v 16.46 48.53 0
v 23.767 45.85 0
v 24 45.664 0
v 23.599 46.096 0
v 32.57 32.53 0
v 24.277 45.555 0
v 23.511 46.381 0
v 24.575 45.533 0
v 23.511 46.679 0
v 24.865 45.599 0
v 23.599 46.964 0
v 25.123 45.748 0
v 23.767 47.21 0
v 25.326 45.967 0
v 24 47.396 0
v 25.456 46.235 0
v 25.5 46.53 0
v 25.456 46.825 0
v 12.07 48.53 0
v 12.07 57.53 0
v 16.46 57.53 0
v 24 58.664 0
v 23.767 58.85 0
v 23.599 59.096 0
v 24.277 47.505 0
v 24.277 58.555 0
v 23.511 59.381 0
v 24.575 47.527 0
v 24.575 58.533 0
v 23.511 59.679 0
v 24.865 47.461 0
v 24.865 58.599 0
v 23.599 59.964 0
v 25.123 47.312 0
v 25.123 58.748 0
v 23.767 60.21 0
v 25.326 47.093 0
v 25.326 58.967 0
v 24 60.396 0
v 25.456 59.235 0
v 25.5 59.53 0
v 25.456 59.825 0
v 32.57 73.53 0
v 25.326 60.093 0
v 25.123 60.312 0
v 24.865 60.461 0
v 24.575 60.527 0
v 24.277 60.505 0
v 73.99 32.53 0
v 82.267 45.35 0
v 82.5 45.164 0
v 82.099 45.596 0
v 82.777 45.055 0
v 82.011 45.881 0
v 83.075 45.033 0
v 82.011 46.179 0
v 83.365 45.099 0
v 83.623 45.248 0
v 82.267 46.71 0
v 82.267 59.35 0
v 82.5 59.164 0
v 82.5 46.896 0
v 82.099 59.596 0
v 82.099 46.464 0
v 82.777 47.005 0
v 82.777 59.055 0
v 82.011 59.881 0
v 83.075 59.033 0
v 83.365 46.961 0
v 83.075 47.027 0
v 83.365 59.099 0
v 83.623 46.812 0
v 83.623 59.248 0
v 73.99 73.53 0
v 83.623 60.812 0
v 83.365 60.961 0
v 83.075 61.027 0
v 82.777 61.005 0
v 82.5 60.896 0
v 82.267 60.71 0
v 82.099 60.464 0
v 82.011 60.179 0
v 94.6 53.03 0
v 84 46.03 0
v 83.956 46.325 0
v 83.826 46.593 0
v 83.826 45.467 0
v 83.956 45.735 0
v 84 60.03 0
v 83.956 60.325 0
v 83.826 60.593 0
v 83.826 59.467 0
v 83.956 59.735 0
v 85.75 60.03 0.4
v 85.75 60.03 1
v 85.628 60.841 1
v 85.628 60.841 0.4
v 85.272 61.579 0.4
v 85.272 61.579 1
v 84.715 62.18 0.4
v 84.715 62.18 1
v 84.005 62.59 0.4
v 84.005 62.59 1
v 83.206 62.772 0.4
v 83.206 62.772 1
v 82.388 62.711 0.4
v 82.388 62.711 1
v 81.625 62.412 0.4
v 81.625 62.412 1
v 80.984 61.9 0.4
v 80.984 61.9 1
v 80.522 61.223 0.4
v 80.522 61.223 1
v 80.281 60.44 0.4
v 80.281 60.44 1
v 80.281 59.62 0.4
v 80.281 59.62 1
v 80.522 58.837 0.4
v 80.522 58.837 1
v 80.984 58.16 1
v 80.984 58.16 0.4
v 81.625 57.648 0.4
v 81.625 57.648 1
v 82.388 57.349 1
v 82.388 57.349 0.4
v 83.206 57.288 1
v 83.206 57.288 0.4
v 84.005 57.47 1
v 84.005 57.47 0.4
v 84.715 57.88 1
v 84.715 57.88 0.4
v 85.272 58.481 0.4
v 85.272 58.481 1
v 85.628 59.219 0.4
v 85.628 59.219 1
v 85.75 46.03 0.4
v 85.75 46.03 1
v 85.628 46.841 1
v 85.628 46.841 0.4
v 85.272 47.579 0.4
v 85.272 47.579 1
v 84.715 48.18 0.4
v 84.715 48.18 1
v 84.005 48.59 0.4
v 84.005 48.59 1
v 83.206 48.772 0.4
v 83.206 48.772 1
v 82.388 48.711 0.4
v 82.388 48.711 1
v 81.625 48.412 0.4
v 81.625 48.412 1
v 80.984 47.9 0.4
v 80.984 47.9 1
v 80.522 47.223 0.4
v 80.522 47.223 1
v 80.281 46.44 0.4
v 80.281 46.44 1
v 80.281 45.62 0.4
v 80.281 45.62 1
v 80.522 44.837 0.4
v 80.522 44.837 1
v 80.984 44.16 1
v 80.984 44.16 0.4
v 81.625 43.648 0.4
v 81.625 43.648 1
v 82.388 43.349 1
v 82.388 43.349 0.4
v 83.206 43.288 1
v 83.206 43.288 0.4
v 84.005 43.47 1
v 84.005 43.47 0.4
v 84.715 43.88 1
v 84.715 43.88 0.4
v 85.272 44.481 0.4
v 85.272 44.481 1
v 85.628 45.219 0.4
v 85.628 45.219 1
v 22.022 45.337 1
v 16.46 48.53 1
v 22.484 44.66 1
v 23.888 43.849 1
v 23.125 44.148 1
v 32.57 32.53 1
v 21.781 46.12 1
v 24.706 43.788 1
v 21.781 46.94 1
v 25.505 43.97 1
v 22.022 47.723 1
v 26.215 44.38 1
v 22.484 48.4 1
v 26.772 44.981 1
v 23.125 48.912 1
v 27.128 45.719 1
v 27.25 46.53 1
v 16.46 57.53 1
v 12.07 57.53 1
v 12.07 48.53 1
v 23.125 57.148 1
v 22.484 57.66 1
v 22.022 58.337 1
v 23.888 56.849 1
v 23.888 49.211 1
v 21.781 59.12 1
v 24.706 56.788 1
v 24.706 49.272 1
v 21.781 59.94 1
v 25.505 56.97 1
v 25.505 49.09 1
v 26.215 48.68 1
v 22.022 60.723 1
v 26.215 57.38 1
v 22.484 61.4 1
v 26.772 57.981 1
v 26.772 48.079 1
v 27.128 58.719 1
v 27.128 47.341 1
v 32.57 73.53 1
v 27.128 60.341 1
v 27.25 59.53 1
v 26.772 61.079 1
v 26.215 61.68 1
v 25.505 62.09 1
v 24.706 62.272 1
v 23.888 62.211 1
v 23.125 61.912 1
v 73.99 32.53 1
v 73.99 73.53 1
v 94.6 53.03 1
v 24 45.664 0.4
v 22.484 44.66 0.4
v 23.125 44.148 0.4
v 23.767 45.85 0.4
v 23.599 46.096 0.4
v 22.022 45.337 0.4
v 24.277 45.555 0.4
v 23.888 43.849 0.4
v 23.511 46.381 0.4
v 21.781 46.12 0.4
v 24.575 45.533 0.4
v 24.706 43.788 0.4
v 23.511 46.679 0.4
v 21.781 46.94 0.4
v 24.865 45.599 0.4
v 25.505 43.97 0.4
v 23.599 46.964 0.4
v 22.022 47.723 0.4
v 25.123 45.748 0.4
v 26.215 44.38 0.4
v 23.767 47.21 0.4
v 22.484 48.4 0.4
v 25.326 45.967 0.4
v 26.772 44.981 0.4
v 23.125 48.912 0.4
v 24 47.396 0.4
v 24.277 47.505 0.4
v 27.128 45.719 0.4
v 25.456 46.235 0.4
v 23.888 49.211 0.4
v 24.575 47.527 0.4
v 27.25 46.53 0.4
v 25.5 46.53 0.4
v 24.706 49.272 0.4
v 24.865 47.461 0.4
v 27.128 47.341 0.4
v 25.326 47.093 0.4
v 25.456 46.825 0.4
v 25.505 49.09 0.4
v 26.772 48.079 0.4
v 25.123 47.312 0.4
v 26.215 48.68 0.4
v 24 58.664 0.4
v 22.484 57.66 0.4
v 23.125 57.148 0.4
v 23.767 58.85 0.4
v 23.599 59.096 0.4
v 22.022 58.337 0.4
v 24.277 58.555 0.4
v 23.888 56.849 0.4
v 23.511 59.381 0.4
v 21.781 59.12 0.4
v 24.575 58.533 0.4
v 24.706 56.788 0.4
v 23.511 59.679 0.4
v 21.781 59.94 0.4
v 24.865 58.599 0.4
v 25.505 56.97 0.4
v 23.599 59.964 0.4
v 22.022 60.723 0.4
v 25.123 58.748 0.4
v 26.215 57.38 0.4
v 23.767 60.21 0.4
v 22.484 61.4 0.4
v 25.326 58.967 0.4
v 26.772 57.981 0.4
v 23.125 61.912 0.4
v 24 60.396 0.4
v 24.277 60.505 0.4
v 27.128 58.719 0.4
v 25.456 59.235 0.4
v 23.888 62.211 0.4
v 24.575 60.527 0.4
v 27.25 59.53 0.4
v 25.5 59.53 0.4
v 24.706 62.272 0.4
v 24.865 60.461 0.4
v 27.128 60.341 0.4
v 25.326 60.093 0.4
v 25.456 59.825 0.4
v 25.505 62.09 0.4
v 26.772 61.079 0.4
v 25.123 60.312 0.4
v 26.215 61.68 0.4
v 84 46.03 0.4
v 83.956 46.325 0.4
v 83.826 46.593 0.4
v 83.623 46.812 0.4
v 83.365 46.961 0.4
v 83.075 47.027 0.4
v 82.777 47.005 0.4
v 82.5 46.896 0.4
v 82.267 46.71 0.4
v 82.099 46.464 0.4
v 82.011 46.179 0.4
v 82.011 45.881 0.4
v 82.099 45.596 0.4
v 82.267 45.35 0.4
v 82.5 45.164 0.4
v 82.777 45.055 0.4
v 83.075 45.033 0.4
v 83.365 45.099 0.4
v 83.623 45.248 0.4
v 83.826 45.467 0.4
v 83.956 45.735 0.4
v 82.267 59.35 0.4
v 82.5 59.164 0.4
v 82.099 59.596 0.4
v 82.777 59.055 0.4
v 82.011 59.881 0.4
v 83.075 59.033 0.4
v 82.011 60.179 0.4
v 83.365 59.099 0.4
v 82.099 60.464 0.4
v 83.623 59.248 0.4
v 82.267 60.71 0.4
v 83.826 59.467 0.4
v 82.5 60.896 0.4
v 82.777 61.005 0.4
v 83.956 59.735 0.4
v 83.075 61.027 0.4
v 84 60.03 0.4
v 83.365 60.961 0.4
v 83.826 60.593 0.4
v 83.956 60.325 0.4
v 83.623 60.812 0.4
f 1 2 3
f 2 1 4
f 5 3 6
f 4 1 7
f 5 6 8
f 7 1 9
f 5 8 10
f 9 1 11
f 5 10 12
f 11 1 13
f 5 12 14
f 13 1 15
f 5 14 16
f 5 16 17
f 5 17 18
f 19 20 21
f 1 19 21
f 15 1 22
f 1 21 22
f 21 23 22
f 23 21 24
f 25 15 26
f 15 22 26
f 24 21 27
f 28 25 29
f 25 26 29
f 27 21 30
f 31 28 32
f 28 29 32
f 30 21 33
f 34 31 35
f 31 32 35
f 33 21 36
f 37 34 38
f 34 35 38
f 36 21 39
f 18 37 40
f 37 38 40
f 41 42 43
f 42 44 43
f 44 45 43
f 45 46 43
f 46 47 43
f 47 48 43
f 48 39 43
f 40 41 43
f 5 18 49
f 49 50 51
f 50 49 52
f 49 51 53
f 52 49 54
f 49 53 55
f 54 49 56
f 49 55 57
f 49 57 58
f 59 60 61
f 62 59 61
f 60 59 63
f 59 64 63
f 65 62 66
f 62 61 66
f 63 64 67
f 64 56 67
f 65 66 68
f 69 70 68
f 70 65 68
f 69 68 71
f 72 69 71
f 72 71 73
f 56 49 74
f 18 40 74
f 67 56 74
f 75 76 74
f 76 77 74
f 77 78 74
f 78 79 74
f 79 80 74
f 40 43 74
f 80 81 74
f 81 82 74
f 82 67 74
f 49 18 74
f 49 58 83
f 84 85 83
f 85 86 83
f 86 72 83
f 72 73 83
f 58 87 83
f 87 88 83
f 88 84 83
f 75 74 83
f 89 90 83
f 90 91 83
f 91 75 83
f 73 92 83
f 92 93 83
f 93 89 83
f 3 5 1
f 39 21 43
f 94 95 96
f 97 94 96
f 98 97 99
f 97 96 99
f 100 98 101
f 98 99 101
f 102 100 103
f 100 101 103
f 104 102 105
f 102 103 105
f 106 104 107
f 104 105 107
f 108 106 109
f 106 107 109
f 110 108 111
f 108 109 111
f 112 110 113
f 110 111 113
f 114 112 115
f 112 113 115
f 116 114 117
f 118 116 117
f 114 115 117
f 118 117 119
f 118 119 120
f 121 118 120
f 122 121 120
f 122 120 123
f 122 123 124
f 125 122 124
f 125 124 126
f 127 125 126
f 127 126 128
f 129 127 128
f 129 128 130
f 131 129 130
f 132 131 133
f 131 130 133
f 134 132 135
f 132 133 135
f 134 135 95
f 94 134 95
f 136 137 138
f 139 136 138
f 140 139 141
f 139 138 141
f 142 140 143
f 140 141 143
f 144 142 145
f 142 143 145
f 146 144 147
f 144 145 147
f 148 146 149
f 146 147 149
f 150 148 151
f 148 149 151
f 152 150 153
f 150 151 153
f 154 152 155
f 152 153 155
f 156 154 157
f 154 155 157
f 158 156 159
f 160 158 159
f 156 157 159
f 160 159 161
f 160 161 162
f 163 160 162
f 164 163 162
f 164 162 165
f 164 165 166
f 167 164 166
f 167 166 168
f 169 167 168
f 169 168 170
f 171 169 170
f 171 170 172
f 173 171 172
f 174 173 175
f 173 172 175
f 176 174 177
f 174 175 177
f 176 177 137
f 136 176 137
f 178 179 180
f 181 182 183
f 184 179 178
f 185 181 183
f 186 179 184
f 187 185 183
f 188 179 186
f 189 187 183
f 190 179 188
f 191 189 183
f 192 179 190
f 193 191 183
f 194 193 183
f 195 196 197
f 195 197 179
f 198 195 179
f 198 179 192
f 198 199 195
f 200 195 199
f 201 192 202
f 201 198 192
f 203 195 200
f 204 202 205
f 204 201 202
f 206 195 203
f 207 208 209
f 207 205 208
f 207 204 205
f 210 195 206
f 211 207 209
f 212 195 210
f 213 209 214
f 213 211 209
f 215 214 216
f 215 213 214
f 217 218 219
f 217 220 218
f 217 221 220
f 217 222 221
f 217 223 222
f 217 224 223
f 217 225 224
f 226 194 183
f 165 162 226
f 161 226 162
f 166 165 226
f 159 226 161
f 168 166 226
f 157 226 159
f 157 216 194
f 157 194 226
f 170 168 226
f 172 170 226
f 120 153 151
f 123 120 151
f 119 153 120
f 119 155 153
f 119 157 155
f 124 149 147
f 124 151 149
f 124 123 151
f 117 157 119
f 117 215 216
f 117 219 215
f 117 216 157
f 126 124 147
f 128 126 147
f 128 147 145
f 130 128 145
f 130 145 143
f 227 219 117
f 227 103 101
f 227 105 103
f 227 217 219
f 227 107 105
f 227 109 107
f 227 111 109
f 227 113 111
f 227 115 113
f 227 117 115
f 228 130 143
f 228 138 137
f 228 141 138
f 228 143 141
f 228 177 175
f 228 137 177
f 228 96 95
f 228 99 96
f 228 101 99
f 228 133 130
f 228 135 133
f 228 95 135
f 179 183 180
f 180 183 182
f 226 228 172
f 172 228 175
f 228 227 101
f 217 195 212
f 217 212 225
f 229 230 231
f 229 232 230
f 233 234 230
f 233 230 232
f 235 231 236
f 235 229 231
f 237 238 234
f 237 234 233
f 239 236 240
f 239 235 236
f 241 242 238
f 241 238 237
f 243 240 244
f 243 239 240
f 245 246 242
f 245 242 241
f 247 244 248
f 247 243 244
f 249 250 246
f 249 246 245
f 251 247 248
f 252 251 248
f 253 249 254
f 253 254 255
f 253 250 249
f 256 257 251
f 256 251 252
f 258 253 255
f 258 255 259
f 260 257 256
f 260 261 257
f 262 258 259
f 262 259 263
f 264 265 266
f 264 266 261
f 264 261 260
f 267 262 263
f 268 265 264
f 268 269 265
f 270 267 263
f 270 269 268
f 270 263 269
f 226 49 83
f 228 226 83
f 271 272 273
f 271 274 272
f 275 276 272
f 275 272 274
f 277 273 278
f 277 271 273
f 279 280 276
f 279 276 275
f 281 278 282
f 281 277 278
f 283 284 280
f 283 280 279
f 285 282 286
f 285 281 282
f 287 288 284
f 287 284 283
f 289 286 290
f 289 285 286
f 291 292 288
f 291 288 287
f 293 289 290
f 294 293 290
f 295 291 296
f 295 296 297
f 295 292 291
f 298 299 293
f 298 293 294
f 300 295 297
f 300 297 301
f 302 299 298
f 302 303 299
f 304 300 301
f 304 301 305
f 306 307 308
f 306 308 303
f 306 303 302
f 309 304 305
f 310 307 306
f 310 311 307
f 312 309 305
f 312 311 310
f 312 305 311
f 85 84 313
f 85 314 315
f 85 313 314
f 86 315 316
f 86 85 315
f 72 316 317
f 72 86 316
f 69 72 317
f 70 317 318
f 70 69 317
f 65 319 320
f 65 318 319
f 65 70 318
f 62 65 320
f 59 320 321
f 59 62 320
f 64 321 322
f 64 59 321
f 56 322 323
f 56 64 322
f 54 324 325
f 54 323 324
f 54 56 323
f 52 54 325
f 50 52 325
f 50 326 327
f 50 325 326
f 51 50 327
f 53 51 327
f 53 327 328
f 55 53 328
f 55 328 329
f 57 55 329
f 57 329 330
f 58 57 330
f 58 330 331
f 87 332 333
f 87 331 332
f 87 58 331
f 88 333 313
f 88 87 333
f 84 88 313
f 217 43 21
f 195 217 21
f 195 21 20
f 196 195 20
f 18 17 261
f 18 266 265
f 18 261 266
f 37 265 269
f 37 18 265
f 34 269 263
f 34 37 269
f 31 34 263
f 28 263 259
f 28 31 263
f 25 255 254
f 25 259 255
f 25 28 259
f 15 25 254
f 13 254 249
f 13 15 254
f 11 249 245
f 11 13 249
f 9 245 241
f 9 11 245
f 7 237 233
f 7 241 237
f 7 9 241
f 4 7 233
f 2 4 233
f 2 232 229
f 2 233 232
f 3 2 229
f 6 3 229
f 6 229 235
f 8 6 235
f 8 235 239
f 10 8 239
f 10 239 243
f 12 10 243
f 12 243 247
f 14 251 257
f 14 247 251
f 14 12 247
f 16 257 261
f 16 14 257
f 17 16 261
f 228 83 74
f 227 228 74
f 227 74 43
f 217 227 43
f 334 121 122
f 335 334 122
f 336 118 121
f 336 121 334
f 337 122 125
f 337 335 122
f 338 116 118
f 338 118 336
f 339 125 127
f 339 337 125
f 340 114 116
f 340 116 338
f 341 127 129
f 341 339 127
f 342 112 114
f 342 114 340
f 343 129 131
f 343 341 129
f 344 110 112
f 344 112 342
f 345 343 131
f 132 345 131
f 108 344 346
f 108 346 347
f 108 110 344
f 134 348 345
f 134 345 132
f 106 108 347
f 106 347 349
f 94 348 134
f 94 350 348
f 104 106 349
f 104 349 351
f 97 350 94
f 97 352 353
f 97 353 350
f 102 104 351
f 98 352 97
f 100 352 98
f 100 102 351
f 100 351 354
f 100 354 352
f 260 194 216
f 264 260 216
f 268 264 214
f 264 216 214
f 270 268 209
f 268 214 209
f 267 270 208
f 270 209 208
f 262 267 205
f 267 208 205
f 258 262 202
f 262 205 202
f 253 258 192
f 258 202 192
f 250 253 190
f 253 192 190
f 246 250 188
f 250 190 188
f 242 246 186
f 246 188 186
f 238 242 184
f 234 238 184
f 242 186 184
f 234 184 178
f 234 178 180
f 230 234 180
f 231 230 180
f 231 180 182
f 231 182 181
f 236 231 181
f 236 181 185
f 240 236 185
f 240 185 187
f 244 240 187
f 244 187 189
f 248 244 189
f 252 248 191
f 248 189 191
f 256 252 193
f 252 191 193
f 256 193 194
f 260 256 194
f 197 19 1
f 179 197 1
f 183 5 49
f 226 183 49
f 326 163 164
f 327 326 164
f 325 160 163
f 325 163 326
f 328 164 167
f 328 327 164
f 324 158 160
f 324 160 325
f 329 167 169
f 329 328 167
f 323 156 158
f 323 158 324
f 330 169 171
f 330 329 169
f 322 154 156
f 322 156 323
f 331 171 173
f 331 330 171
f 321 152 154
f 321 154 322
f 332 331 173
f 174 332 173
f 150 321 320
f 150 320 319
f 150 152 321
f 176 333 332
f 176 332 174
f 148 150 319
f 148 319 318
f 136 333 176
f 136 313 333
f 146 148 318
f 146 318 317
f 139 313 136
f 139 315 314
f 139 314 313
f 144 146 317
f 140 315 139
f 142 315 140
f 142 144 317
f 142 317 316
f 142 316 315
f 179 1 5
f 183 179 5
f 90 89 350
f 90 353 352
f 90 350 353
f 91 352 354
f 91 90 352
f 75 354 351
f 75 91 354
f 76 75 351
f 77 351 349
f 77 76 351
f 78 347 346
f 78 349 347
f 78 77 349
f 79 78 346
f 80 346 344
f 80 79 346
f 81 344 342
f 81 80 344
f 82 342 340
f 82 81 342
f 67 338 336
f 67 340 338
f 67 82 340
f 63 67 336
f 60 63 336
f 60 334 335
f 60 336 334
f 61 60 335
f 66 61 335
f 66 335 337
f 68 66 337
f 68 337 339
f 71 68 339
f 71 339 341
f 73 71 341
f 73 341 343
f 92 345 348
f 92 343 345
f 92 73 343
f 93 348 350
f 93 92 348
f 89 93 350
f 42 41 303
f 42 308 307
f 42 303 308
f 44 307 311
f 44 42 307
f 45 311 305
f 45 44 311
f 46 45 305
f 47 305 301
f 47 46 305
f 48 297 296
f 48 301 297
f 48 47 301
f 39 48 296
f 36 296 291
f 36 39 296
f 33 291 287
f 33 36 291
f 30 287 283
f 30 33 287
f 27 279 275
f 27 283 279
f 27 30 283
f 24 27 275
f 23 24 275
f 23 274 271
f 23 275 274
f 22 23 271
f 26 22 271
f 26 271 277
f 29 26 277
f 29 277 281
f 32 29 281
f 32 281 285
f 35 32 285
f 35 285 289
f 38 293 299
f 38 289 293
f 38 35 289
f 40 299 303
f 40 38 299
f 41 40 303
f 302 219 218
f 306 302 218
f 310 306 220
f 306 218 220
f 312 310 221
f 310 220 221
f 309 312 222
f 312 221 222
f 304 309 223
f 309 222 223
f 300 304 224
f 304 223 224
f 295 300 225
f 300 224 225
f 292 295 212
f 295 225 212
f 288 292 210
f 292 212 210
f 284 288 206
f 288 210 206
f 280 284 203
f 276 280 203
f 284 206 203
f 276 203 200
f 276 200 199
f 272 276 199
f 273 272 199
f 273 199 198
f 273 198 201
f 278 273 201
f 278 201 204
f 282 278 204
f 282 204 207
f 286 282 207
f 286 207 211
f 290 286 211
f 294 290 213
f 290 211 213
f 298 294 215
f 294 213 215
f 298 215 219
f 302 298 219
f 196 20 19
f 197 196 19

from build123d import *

# Parameters (mm, degrees)
SKETCH2_R           = 1
BOSS_EXTRUDE1_DEPTH = 1
CUT_EXTRUDE1_START  = 1
SKETCH3_R           = 2.75
CUT_EXTRUDE1_DEPTH  = 0.6


with BuildPart() as part:
    # Sketch2 → Boss-Extrude1 (new body)
    with BuildSketch(Plane.XY):
        Polygon((16.46, 48.53), (32.57, 32.53), (73.99, 32.53), (94.6, 53.03), (73.99, 73.53), (32.57, 73.53), (16.46, 57.53), (12.07, 57.53), (12.07, 48.53), align=None)
        with Locations((24.5, 59.53)):
            Circle(SKETCH2_R, mode=Mode.SUBTRACT)
        with Locations((24.5, 46.53)):
            Circle(SKETCH2_R, mode=Mode.SUBTRACT)
        with Locations((83, 60.03)):
            Circle(SKETCH2_R, mode=Mode.SUBTRACT)
        with Locations((83, 46.03)):
            Circle(SKETCH2_R, mode=Mode.SUBTRACT)
    extrude(amount=BOSS_EXTRUDE1_DEPTH)

    # Sketch3 → Cut-Extrude1 (cut)
    with BuildSketch(Plane.XY.offset(CUT_EXTRUDE1_START)):
        with Locations((24.5, 59.53)):
            Circle(SKETCH3_R)
        with Locations((24.5, 46.53)):
            Circle(SKETCH3_R)
        with Locations((83, 60.03)):
            Circle(SKETCH3_R)
        with Locations((83, 46.03)):
            Circle(SKETCH3_R)
    extrude(amount=-CUT_EXTRUDE1_DEPTH, mode=Mode.SUBTRACT)


solid = part.part
